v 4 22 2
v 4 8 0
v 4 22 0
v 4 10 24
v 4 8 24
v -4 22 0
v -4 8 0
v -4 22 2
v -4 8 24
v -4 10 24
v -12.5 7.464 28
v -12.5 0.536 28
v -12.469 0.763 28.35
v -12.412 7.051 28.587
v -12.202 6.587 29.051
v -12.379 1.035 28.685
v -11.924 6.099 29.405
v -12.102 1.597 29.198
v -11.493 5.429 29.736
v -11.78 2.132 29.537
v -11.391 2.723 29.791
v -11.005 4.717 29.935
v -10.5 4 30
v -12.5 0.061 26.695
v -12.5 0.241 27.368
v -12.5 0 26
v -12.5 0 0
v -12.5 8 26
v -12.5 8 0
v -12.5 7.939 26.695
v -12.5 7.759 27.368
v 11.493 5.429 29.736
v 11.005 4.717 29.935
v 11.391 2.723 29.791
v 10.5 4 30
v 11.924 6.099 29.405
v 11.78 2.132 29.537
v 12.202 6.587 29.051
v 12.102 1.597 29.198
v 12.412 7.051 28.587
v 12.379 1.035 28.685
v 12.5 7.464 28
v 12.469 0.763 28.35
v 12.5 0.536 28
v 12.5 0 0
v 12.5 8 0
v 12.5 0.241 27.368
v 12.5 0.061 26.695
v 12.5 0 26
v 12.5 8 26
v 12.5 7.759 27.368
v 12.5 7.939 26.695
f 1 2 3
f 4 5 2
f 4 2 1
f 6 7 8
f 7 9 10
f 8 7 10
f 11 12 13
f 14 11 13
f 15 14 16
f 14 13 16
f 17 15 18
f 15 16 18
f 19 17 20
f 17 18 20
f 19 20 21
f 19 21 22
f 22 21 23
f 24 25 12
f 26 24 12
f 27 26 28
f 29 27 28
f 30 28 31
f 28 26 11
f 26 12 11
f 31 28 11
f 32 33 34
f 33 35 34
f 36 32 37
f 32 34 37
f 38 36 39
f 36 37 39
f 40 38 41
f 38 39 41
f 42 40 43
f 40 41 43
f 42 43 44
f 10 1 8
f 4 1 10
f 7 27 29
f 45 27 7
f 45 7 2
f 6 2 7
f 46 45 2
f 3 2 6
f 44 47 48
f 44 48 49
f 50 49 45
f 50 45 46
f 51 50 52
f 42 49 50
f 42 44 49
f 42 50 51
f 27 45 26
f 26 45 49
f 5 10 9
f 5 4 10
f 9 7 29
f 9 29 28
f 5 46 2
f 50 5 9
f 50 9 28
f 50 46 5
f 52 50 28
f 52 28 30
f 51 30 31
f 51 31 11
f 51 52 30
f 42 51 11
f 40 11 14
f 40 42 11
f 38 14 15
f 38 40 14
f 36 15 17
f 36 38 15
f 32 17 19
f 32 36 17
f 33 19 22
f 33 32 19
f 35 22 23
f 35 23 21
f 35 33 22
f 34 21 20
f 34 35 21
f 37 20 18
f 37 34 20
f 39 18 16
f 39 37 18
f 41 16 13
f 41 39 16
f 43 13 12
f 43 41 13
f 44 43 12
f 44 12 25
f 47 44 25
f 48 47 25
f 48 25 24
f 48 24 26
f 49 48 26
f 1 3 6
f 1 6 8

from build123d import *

# Parameters (mm, degrees)
F0_W     = 8
F0_H     = 26
F1_DEPTH = 12.5
F3_DEPTH = 4
F5_DEPTH = 25


with BuildPart() as f1:
    # F0 (on Right) → F1 (new body, symmetric)
    with BuildSketch(Plane.YZ):
        with Locations((4, 13)):
            Rectangle(F0_W, F0_H)
        with BuildLine():
            ThreePointArc((8, 26), (4, 30), (0, 26))
            Line((0, 26), (8, 26))
        make_face()
    extrude(amount=F1_DEPTH, both=True)

    # F2 (on Right) → F3 (join, symmetric)
    with BuildSketch(Plane.YZ):
        Polygon((8, 24), (8, 0), (22, 0), (22, 2), (10, 24), align=None)
    extrude(amount=F3_DEPTH, both=True)

    # F4 (on Front) → F5 (cut)
    with BuildSketch(Plane.XZ):
        with BuildLine():
            Line((-10.5, 30), (-12.5, 30))
            Line((-12.5, 30), (-12.5, 28))
            ThreePointArc((-12.5, 28), (-11.914214, 29.414214), (-10.5, 30))
        make_face()
        with BuildLine():
            ThreePointArc((10.5, 30), (11.914214, 29.414214), (12.5, 28))
            Line((12.5, 28), (12.5, 30))
            Line((12.5, 30), (10.5, 30))
        make_face()
    extrude(amount=-F5_DEPTH, mode=Mode.SUBTRACT)


solid = f1.part
